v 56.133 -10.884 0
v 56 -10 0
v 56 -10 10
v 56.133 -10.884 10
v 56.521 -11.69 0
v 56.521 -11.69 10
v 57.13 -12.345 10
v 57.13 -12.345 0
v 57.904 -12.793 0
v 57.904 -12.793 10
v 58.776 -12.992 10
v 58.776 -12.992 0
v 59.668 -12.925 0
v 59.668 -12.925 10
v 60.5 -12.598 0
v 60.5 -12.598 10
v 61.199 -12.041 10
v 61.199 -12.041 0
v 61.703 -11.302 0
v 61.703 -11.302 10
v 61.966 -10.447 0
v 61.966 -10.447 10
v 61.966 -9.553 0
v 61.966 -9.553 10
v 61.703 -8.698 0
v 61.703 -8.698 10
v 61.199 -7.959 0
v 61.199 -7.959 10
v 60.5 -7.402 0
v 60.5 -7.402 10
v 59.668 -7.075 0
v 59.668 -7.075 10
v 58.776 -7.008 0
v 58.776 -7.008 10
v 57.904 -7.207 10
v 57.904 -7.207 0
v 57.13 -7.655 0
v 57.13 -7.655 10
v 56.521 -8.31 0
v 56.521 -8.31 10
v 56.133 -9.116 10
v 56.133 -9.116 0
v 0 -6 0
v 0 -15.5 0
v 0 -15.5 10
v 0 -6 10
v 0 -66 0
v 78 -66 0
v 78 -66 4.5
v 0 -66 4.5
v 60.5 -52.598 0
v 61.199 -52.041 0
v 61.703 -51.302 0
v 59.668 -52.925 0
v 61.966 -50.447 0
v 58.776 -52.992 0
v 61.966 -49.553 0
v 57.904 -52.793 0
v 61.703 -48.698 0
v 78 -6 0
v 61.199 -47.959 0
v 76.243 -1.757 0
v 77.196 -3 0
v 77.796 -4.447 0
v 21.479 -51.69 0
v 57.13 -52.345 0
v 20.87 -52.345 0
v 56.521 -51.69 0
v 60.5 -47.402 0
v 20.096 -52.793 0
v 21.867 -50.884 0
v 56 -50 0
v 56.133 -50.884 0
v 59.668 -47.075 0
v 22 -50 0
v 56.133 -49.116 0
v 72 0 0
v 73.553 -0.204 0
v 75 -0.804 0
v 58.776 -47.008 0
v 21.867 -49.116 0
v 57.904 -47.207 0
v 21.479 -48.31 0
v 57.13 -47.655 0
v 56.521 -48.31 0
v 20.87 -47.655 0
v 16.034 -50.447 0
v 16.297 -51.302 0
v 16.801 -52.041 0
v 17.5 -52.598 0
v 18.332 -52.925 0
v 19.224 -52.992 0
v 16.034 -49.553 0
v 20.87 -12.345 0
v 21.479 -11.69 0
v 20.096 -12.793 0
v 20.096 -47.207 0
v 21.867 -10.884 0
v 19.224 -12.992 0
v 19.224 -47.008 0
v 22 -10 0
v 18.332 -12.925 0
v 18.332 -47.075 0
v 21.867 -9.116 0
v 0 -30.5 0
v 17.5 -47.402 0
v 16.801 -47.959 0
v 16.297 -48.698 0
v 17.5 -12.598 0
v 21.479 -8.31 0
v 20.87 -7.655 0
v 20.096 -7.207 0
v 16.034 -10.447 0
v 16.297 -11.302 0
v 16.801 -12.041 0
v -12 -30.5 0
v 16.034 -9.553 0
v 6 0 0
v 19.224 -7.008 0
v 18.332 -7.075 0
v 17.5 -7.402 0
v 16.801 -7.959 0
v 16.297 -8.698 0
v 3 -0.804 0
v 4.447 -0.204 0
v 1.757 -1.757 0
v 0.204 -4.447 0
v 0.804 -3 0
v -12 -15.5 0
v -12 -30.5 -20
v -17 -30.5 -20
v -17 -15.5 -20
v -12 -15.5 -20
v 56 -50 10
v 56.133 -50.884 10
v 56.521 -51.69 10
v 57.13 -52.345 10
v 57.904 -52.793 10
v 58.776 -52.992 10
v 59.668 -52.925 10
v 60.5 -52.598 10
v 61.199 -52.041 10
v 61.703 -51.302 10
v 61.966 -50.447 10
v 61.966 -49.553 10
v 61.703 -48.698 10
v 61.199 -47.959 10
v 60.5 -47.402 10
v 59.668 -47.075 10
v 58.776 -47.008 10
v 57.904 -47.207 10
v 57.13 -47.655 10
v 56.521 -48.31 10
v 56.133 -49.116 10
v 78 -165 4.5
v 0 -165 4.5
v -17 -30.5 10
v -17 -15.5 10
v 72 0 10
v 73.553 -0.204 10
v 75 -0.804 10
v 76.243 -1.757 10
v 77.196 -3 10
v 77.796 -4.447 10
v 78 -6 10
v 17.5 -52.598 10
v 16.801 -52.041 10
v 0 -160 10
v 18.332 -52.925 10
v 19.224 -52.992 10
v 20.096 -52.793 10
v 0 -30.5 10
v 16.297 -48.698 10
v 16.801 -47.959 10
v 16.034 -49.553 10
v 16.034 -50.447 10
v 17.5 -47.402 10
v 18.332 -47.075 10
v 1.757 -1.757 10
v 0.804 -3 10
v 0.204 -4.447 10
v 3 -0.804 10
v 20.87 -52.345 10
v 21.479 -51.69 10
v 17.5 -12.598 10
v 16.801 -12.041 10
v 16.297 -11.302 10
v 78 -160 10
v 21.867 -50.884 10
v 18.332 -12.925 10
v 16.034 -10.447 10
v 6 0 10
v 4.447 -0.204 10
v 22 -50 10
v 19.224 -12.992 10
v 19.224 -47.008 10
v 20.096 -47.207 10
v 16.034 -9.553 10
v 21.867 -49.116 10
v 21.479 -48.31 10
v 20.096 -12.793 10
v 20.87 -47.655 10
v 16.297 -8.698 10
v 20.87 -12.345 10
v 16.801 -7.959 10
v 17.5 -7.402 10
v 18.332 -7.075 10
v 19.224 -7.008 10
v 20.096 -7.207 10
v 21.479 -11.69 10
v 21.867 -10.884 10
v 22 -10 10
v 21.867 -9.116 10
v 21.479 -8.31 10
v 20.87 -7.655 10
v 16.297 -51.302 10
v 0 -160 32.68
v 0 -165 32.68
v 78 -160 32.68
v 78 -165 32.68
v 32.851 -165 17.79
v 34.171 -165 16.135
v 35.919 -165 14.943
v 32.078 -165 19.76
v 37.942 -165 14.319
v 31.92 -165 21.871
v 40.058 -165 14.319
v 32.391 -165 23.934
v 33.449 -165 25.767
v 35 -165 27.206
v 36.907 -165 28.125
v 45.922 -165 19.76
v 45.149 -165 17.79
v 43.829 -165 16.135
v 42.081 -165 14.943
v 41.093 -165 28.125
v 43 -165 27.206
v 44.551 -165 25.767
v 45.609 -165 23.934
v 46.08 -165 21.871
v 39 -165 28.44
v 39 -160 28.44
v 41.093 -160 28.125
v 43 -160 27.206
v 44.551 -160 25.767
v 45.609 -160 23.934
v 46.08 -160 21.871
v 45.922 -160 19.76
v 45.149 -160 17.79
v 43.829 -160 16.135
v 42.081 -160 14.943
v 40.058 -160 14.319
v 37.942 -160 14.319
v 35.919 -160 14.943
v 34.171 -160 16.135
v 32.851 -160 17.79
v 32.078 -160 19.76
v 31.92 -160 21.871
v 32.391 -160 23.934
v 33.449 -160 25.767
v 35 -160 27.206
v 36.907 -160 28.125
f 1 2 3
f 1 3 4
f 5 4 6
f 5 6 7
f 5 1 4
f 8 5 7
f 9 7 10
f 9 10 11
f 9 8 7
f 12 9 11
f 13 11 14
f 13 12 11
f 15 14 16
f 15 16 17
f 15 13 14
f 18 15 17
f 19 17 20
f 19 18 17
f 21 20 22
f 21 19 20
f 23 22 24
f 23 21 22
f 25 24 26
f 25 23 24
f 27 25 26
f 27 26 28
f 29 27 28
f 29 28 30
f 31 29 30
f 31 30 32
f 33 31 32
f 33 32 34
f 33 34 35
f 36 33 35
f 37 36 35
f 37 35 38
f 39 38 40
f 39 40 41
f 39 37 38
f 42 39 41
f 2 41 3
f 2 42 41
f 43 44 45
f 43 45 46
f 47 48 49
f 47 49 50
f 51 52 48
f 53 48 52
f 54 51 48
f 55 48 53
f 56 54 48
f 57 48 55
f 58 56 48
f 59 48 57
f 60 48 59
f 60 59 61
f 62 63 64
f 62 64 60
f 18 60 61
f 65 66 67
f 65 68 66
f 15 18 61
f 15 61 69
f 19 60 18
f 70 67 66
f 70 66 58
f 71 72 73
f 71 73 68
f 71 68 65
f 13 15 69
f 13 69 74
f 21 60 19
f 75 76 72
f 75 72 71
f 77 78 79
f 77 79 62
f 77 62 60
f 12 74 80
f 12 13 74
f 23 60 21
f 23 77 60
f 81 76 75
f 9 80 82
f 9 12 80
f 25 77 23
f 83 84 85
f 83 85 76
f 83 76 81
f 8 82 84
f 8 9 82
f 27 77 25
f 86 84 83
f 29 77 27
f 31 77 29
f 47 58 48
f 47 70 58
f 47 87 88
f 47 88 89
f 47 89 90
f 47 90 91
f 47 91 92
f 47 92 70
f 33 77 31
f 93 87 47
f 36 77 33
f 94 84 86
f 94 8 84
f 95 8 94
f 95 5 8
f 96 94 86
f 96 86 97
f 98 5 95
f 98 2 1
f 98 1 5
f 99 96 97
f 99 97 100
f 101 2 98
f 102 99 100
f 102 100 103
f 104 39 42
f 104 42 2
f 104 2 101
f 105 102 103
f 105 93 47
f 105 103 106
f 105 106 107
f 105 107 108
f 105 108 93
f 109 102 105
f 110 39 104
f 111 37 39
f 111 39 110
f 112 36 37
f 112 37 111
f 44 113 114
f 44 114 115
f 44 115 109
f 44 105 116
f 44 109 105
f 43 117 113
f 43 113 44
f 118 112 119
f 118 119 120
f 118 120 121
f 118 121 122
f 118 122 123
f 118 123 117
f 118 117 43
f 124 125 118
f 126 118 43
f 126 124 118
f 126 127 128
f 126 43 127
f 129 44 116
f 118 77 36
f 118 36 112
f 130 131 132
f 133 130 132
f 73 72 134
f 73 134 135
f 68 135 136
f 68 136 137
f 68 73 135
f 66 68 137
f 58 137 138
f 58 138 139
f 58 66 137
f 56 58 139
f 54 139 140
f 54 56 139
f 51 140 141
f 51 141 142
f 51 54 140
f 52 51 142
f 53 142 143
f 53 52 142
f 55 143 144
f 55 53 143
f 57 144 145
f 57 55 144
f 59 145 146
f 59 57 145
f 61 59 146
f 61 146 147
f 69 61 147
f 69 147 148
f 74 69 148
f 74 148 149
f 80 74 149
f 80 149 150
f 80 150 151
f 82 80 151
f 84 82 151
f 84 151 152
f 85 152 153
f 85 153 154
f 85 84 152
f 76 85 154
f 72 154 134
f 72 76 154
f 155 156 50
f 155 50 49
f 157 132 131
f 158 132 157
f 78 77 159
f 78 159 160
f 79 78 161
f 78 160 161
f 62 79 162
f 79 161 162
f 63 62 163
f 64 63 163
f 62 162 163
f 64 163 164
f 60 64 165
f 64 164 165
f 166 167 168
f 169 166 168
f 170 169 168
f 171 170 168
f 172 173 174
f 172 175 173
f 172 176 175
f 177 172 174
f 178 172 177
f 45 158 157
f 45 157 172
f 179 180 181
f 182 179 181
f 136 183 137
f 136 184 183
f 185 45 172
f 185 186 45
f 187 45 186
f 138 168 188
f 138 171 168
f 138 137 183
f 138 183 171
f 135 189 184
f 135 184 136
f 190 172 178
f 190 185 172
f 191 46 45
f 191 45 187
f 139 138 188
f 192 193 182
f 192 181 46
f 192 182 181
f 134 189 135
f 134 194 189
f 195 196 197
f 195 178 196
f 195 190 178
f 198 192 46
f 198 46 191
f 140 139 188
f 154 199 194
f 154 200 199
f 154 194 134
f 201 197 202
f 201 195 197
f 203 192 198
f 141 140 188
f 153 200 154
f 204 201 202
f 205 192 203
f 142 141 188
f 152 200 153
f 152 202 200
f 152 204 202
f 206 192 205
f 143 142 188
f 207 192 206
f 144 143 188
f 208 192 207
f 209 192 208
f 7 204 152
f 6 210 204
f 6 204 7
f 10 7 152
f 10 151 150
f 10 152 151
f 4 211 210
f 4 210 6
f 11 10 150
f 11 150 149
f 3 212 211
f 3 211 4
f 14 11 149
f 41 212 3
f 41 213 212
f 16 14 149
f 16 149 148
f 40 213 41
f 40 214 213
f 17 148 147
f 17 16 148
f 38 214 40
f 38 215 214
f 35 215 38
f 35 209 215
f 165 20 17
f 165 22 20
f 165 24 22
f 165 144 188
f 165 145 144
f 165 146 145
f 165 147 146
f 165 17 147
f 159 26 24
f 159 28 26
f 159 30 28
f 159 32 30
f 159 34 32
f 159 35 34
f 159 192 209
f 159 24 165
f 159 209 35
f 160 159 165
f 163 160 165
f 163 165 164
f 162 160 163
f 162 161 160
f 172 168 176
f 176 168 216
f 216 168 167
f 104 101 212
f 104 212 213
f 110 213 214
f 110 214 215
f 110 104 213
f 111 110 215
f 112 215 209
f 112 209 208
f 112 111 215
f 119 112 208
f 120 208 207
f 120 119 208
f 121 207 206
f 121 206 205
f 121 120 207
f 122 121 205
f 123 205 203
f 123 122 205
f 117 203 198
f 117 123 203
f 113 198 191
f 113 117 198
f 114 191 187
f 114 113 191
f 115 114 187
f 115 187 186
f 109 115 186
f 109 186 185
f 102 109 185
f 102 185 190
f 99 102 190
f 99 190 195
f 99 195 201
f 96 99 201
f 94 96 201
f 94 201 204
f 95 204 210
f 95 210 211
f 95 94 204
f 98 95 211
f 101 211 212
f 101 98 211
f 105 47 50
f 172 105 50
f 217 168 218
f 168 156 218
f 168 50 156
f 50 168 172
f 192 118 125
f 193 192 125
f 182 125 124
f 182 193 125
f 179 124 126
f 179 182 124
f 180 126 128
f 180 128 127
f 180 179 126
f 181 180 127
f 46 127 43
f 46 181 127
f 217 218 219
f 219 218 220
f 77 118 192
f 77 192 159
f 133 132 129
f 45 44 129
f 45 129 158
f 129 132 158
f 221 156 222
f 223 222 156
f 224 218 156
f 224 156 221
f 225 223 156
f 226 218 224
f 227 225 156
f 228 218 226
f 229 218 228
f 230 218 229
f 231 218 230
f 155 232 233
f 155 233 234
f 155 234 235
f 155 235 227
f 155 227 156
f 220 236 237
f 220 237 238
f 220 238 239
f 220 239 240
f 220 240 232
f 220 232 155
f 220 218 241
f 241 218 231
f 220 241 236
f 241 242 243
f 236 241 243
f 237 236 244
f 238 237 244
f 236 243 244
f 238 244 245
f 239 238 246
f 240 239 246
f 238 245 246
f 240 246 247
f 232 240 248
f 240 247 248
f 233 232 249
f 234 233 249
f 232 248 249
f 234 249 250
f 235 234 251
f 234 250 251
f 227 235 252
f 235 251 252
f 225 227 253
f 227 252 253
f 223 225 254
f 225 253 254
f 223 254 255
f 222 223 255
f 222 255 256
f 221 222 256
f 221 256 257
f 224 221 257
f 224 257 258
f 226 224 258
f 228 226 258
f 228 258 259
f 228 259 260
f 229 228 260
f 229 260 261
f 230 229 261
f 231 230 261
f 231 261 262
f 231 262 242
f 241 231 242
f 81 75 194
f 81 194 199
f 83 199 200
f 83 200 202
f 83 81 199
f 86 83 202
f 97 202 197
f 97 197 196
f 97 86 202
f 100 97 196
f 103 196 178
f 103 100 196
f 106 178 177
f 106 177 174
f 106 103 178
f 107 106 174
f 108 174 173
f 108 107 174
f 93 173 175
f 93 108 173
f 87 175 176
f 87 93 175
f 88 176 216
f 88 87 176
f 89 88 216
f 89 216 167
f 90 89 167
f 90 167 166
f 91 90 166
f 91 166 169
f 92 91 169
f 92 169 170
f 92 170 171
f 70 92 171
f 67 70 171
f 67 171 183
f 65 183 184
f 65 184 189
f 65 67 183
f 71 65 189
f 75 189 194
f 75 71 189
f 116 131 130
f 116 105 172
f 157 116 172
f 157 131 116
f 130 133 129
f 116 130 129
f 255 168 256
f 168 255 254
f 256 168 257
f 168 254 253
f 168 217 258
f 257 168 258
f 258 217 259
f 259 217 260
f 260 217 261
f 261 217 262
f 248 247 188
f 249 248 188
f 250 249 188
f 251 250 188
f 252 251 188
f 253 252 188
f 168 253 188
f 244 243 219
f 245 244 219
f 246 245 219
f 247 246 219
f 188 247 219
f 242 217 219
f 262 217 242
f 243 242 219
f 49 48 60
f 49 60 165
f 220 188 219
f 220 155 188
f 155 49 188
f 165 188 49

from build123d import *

# Parameters (mm, degrees)
CROQUIS1_R              = 3
SALIENTE_EXTRUIR1_DEPTH = 10
REDONDEO3_R             = 6
REDONDEO4_R             = 6
CROQUIS3_W              = 78
CROQUIS3_H              = 99
SALIENTE_EXTRUIR2_DEPTH = 5.5
CROQUIS4_W              = 78
CROQUIS4_H              = 22.679982155
SALIENTE_EXTRUIR3_DEPTH = 5
CROQUIS6_R              = 7.1
CORTAR_EXTRUIR1_DEPTH   = 40
CROQUIS7_W              = 20
CROQUIS7_H              = 15
SALIENTE_EXTRUIR4_DEPTH = 5


with BuildPart() as part:
    # Croquis1 → Saliente-Extruir1 (new body)
    with BuildSketch(Plane.XY):
        Polygon((0, 0), (78, 0), (78, -66), (0, -66), (0, -30.5), (-10, -30.5), (-17, -30.5), (-17, -15.5), (0, -15.5), align=None)
        with Locations((19, -10)):
            Circle(CROQUIS1_R, mode=Mode.SUBTRACT)
        with Locations((19, -50)):
            Circle(CROQUIS1_R, mode=Mode.SUBTRACT)
        with Locations(Location((59, -50, 0), (0, 0, 180))):
            Circle(CROQUIS1_R, mode=Mode.SUBTRACT)
        with Locations(Location((59, -10, 0), (0, 0, 180))):
            Circle(CROQUIS1_R, mode=Mode.SUBTRACT)
    extrude(amount=SALIENTE_EXTRUIR1_DEPTH)

    # Redondeo3
    redondeo3_edges = [part.edges().sort_by_distance(p)[0] for p in [
        (0, 0, 5),
    ]]
    fillet(redondeo3_edges, radius=REDONDEO3_R)

    # Redondeo4
    redondeo4_edges = [part.edges().sort_by_distance(p)[0] for p in [
        (78, 0, 5),
    ]]
    fillet(redondeo4_edges, radius=REDONDEO4_R)

    # Croquis3 → Saliente-Extruir2 (add)
    with BuildSketch(Plane.XY.offset(10)):
        with Locations((39, -115.5)):
            Rectangle(CROQUIS3_W, CROQUIS3_H)
    extrude(amount=-SALIENTE_EXTRUIR2_DEPTH)

    # Croquis4 → Saliente-Extruir3 (add)
    with BuildSketch(Plane.XZ.offset(165)):
        with Locations((39, 21.339991078)):
            Rectangle(CROQUIS4_W, CROQUIS4_H)
    extrude(amount=-SALIENTE_EXTRUIR3_DEPTH)

    # Croquis6 → Cortar-Extruir1 (cut)
    with BuildSketch(Plane(origin=(0, -160, 0), x_dir=(1, 0, 0), z_dir=(0, 1, 0))):
        with Locations(Location((39, -21.339991078, 0), (0, 0, 270))):
            Circle(CROQUIS6_R)
    extrude(amount=-CORTAR_EXTRUIR1_DEPTH, mode=Mode.SUBTRACT)

    # Croquis7 → Saliente-Extruir4 (add)
    with BuildSketch(Plane.ZY.offset(17)):
        with Locations((-10, -23)):
            Rectangle(CROQUIS7_W, CROQUIS7_H)
    extrude(amount=-SALIENTE_EXTRUIR4_DEPTH)


solid = part.part
